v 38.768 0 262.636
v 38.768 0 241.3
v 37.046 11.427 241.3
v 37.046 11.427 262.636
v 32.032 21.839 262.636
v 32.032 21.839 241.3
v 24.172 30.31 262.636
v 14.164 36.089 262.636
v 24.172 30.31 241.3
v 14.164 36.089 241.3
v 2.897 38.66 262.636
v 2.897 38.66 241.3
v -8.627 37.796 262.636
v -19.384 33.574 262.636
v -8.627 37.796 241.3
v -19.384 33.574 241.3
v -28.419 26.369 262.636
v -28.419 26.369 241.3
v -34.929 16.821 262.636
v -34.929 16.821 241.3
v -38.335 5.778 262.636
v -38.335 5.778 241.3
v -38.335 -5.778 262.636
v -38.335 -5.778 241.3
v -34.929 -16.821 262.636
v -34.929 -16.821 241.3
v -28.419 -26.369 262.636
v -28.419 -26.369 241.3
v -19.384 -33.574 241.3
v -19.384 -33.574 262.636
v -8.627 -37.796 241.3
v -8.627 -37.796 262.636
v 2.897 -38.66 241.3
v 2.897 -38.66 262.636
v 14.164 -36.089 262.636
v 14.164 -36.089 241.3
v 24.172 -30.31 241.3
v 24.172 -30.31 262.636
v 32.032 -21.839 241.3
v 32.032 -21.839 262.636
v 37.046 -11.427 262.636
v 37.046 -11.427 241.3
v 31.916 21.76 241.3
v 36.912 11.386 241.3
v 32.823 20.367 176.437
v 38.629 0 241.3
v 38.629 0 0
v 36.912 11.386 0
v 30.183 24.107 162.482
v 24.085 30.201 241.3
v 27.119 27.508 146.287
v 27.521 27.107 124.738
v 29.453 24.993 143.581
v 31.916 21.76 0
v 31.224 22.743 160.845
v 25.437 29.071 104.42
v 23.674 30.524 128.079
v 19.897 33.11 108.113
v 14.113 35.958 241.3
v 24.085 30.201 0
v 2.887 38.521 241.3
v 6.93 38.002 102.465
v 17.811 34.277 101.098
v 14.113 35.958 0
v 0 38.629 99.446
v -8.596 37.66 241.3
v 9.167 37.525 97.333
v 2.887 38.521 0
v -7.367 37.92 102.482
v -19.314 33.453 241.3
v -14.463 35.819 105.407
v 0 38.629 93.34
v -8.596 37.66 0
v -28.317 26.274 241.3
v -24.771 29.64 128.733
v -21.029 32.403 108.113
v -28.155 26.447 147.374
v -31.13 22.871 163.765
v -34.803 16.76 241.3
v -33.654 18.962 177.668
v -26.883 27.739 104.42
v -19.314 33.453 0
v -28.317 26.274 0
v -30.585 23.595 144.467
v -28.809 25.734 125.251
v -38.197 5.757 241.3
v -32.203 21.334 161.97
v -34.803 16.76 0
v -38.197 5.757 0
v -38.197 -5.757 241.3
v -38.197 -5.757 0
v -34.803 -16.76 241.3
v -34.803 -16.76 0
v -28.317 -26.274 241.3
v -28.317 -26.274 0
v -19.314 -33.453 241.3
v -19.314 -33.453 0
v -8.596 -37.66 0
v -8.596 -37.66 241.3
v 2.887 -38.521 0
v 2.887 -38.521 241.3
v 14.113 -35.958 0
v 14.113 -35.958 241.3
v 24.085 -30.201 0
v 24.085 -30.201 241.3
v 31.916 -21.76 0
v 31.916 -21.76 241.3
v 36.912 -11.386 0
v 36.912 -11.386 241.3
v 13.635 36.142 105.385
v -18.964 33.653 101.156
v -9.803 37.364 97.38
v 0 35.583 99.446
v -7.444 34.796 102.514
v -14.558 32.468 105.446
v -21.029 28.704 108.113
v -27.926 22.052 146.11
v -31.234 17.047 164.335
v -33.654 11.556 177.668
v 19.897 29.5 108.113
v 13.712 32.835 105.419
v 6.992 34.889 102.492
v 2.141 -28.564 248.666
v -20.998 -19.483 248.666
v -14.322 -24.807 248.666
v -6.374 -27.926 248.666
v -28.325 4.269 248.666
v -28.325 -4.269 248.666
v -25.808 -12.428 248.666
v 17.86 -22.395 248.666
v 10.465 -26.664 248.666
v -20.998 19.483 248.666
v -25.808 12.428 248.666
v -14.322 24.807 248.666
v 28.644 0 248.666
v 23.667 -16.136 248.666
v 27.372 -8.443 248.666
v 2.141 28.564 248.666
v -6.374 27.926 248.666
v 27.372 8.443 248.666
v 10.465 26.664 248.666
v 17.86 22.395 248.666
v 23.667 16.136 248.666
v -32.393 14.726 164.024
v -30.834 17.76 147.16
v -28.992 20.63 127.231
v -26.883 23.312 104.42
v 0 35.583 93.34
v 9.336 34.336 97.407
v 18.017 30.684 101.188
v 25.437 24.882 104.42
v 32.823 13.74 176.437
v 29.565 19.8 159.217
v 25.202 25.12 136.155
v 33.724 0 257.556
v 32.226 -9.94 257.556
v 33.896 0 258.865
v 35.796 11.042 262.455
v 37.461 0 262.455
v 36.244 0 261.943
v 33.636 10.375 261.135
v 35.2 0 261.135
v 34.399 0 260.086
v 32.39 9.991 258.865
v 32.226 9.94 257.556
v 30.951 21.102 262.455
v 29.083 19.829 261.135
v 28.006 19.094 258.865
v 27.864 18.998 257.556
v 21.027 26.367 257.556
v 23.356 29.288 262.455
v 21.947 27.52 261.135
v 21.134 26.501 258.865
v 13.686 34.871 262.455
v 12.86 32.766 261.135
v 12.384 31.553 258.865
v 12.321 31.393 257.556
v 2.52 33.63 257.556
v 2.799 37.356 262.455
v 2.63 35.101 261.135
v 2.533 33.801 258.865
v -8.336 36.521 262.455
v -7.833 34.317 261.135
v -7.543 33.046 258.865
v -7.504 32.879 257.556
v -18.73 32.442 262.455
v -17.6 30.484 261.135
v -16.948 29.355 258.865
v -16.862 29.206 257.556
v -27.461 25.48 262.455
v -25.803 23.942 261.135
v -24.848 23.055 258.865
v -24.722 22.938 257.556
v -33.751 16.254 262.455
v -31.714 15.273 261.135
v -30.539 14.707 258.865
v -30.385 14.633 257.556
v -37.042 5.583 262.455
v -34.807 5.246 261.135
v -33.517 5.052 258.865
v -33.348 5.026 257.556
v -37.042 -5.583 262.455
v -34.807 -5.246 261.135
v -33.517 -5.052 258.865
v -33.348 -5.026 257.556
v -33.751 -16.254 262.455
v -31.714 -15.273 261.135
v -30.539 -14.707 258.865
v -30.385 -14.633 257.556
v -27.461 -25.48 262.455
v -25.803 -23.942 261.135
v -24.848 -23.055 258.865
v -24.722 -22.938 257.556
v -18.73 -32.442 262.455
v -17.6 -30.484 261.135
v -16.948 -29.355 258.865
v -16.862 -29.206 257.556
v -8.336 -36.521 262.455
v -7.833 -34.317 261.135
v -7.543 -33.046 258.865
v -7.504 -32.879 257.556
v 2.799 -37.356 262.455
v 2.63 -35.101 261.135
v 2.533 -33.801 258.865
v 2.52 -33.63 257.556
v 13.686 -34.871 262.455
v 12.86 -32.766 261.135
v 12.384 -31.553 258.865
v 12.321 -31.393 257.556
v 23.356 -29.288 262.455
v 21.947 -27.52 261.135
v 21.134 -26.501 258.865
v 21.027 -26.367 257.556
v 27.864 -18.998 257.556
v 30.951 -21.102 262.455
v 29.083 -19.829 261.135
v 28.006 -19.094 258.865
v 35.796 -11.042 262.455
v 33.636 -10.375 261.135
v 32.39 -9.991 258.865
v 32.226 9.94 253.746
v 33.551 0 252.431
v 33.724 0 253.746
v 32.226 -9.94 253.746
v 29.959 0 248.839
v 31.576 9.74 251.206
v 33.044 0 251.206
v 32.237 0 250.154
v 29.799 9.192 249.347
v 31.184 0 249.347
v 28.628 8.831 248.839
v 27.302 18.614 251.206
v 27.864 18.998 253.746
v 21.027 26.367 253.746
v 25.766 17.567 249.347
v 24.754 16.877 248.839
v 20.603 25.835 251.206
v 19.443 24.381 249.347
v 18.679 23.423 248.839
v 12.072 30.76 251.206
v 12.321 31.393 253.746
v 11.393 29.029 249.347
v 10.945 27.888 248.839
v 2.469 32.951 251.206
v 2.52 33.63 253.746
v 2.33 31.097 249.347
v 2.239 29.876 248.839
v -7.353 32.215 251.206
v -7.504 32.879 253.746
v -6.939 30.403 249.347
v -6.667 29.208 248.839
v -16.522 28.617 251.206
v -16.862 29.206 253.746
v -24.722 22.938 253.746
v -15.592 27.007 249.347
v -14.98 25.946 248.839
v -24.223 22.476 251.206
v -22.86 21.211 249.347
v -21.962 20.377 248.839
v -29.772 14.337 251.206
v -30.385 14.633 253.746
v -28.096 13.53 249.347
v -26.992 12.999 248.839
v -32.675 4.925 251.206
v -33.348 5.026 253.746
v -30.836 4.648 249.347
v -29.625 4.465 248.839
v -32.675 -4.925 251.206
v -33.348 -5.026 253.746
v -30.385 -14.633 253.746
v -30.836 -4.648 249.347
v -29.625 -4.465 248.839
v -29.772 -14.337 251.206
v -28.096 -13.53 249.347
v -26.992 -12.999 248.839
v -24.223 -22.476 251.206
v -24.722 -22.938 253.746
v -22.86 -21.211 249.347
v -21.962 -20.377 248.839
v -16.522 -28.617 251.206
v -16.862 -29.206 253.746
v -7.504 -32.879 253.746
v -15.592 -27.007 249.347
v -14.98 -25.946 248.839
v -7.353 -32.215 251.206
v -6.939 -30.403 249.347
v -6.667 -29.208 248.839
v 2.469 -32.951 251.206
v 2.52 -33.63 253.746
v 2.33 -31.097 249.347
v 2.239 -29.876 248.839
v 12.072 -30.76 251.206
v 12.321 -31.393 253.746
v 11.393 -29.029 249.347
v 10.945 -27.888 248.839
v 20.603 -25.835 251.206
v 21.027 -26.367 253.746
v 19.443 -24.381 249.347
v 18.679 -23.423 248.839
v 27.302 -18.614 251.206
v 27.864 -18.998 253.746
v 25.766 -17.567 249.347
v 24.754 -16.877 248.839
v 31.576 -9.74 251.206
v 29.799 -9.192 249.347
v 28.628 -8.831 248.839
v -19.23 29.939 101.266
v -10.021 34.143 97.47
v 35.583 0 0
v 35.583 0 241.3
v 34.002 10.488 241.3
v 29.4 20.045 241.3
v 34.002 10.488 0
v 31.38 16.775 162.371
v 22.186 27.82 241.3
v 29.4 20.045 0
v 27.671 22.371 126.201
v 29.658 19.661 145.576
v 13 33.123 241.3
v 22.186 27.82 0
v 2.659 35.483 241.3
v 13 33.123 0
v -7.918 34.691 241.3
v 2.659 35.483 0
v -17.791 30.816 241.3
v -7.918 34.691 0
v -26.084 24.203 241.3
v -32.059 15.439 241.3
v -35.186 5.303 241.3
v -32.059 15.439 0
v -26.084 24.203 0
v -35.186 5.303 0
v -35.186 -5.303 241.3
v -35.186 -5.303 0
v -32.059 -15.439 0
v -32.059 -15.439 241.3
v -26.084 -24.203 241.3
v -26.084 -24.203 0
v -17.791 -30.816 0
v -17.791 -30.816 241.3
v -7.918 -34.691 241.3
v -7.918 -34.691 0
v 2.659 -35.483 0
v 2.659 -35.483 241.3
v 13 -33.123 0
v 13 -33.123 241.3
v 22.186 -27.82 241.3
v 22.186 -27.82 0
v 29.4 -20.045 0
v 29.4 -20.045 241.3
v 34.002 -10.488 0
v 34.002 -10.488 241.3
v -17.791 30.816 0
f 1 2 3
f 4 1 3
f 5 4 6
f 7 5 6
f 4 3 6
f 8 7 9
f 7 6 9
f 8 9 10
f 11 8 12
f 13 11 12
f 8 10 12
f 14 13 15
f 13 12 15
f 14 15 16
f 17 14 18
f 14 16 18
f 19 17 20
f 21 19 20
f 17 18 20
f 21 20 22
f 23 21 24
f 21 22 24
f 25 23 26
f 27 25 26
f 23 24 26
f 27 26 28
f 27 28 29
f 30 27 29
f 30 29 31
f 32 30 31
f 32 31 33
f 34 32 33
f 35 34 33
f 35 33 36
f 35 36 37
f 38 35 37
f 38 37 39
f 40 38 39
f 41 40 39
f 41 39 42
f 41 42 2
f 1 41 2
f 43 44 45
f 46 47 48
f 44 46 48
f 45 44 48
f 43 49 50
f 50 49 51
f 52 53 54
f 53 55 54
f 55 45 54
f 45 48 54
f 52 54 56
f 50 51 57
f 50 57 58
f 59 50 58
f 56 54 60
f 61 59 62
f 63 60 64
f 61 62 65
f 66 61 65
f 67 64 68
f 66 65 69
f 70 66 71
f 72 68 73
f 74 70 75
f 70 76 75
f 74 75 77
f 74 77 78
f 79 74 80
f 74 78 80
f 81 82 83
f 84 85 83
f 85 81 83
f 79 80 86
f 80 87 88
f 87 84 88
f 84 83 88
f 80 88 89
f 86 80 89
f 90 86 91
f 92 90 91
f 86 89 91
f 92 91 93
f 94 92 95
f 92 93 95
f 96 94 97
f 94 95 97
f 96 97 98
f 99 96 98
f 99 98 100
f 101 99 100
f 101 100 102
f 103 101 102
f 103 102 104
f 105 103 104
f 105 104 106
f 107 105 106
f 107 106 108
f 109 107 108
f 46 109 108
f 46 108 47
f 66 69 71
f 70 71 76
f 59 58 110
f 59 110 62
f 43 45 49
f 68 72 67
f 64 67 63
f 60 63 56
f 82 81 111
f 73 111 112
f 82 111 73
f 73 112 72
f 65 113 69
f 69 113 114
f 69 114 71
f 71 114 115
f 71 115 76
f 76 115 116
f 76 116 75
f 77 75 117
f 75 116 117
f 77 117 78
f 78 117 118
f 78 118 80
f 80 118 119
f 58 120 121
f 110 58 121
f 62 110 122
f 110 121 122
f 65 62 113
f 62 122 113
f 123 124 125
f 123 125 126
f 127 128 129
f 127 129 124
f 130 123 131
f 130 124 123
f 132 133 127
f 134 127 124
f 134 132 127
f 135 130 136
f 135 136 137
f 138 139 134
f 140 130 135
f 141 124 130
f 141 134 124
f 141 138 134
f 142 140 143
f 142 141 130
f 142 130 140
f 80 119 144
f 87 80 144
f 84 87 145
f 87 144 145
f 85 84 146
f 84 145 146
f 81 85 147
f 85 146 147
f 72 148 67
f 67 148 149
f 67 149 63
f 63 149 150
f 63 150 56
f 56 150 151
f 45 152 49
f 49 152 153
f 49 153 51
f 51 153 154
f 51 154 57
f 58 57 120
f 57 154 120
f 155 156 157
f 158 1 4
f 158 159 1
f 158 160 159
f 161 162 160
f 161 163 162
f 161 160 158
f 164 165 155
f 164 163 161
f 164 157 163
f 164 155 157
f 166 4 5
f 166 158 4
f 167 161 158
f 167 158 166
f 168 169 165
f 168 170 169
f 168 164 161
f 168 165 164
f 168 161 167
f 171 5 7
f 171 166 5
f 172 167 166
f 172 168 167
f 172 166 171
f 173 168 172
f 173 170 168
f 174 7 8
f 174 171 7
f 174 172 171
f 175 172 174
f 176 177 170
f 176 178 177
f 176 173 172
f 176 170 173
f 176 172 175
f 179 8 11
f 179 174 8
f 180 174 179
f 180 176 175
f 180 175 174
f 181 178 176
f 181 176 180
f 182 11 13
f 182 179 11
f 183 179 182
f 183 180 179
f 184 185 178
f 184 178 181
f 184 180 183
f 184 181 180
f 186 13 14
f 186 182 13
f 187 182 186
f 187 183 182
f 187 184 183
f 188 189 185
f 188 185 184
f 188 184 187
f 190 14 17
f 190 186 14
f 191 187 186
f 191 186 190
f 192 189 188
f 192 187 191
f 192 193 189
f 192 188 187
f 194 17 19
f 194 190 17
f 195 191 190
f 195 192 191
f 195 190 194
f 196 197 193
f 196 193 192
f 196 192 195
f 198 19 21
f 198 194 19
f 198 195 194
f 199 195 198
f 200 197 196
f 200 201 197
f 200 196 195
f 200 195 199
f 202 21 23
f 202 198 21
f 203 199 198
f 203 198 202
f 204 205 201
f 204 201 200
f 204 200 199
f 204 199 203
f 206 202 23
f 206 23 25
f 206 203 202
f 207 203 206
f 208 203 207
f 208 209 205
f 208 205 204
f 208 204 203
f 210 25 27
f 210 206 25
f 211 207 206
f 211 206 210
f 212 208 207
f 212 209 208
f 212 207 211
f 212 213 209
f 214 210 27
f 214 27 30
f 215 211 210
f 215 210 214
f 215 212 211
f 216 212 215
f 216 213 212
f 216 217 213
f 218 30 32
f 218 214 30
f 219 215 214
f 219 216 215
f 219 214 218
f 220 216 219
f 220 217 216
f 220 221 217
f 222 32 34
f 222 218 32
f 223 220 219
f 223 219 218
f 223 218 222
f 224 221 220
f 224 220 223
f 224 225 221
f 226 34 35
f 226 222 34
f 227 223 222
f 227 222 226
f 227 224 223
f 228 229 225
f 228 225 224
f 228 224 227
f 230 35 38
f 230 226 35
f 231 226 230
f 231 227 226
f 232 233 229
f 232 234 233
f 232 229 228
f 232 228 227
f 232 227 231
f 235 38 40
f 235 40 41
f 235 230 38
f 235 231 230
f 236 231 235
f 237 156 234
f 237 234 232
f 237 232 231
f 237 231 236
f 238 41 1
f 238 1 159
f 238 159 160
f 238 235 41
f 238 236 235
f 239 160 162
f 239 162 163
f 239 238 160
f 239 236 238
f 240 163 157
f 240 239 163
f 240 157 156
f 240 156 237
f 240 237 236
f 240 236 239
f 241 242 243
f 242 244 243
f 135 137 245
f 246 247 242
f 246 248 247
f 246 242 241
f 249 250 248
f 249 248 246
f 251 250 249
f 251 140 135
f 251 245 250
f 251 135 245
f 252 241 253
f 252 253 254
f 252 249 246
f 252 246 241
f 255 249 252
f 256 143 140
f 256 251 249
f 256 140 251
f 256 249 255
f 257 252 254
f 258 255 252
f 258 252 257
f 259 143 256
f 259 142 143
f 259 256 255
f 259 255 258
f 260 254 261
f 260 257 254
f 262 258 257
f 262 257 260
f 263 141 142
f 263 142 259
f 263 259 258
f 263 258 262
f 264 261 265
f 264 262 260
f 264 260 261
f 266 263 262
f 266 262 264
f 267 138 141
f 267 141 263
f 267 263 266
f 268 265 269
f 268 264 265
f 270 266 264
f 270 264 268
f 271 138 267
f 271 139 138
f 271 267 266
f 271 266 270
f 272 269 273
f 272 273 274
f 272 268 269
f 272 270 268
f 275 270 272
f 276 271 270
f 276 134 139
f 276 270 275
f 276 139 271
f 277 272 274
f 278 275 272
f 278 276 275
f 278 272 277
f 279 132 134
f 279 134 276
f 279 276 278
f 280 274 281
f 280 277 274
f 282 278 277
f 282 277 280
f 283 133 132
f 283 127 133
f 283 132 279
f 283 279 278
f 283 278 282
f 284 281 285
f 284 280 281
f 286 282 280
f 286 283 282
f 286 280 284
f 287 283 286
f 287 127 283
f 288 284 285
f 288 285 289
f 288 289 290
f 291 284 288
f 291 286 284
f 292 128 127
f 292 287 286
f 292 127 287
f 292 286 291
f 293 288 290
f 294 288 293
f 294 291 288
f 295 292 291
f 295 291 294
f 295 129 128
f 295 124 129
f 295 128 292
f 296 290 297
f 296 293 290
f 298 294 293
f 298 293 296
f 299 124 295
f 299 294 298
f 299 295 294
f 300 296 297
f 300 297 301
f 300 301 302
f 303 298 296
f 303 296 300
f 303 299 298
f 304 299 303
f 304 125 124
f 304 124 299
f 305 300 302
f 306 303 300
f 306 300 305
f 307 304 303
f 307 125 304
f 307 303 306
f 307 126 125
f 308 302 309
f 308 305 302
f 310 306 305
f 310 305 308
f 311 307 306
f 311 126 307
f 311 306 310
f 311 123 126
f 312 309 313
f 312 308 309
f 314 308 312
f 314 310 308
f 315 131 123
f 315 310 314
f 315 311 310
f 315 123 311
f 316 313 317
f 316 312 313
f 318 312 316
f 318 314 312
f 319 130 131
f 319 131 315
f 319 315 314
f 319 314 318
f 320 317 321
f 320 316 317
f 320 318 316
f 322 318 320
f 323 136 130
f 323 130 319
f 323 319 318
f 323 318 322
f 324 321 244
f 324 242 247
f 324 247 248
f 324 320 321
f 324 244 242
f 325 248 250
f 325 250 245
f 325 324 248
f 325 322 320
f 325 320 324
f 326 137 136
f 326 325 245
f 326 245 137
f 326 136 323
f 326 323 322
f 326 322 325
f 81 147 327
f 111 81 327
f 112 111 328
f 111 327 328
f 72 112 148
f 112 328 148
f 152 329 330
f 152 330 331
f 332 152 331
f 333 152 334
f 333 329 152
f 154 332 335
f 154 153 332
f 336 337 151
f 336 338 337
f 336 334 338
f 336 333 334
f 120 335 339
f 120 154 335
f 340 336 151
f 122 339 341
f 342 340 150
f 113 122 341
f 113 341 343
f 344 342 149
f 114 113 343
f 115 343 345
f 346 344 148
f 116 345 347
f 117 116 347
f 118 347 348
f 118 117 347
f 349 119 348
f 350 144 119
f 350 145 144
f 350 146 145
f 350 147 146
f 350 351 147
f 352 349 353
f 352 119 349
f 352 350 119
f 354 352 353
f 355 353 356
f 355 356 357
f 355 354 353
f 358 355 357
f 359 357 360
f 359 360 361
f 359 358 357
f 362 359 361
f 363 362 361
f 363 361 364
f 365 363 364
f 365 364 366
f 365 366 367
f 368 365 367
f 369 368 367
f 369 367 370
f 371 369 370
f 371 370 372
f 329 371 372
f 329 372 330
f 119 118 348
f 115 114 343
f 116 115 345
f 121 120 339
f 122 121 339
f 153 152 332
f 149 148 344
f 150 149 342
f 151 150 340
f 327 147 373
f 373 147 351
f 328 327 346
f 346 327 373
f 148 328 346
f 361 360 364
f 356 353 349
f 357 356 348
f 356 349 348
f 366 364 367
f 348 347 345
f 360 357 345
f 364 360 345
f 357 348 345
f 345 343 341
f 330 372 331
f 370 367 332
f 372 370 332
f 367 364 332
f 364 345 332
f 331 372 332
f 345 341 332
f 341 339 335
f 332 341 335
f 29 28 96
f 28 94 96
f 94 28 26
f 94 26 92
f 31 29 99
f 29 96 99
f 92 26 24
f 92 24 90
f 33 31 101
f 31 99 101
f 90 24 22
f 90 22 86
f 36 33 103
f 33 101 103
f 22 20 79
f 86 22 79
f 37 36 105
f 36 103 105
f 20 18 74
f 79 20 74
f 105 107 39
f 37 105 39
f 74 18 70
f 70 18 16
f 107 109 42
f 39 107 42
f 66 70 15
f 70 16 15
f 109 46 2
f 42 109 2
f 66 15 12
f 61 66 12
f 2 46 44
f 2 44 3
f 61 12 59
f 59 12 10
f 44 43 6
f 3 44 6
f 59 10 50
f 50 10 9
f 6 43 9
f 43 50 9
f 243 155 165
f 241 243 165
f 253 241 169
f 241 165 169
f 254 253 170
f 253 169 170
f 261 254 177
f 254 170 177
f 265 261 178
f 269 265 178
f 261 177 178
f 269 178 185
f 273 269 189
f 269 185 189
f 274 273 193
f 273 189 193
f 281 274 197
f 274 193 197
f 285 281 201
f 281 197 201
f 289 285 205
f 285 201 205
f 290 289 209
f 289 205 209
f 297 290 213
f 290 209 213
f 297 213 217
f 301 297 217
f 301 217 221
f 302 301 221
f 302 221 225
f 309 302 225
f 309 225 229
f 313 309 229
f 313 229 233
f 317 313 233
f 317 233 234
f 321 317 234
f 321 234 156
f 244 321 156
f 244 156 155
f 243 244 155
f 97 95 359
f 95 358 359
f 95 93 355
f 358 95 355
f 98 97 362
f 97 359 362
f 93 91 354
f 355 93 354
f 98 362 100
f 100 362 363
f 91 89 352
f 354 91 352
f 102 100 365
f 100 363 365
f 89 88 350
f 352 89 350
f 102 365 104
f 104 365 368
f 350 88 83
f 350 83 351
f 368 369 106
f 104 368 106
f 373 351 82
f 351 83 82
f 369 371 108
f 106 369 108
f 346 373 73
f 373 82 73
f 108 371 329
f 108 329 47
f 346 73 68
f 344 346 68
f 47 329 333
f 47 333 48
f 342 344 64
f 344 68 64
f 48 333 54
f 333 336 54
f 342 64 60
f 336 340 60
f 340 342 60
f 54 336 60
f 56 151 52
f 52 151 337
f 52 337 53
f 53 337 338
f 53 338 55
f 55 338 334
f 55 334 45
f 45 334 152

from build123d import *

# Parameters (mm, degrees)
F0_R     = 38.628552608
F0_R_2   = 35.5829437887
F1_DEPTH = 241.3
F2_R     = 38.7684611147
F3_DEPTH = 21.336
F4_R     = 33.724483213
F5_DEPTH = 13.97
F8_DEPTH = 59.944


# Not quite as in the source:
# - a fillet or chamfer that OpenCascade refuses, or shapes differently, is made with other operations: its cross-section is extruded or revolved along the edge and cut away or added


with BuildPart() as f1:
    # F0 (on Top) → F1 (new body)
    with BuildSketch(Plane.XY):
        Circle(F0_R)
        Circle(F0_R_2, mode=Mode.SUBTRACT)
    extrude(amount=F1_DEPTH)

    # F2 (on face) → F3 (join)
    with BuildSketch(Plane.XY.offset(241.3)):
        Circle(F2_R)
    extrude(amount=F3_DEPTH)

    # F4 (on face) → F5 (cut)
    with BuildSketch(Plane.XY.offset(262.636)):
        Circle(F4_R)
    extrude(amount=-F5_DEPTH, mode=Mode.SUBTRACT)

    # F6: fillet of radius 5.08 on 3 edges, made by hand

    # F6_s1 → F6_t2 (revolve)
    with BuildSketch(Plane.XZ):
        with BuildLine():
            ThreePointArc((33.724483213, 253.746), (32.2365856615, 250.1538975516), (28.644483213, 248.666))
            Line((28.644483213, 248.666), (33.724483213, 248.666))
            Line((33.724483213, 248.666), (33.724483213, 253.746))
        make_face()
    revolve(axis=Axis((0, 0, 248.666), (0, 0, 1)))

    # F6_s3 → F6_t4 (revolve, cut)
    with BuildSketch(Plane.XZ):
        with BuildLine():
            ThreePointArc((38.804483213, 262.636), (35.2123807646, 261.1481024484), (33.724483213, 257.556))
            Line((33.724483213, 257.556), (33.724483213, 262.636))
            Line((33.724483213, 262.636), (38.804483213, 262.636))
        make_face()
    revolve(axis=Axis((0, 0, 262.636), (0, 0, 1)), mode=Mode.SUBTRACT)

    # F7 (on Front) → F8 (cut)
    with BuildSketch(Plane.XZ):
        Polygon((-21.0285011722, 108.1128418446), (-33.6541458964, 177.6677370071), (-26.883315295, 104.4196635485), (0, 93.3401212096), (25.4367366433, 104.4196635485), (32.8230932355, 176.4366775751), (19.8969673365, 108.1128418446), (0, 99.4462705343), align=None)
    extrude(amount=-F8_DEPTH, mode=Mode.SUBTRACT)


solid = f1.part
